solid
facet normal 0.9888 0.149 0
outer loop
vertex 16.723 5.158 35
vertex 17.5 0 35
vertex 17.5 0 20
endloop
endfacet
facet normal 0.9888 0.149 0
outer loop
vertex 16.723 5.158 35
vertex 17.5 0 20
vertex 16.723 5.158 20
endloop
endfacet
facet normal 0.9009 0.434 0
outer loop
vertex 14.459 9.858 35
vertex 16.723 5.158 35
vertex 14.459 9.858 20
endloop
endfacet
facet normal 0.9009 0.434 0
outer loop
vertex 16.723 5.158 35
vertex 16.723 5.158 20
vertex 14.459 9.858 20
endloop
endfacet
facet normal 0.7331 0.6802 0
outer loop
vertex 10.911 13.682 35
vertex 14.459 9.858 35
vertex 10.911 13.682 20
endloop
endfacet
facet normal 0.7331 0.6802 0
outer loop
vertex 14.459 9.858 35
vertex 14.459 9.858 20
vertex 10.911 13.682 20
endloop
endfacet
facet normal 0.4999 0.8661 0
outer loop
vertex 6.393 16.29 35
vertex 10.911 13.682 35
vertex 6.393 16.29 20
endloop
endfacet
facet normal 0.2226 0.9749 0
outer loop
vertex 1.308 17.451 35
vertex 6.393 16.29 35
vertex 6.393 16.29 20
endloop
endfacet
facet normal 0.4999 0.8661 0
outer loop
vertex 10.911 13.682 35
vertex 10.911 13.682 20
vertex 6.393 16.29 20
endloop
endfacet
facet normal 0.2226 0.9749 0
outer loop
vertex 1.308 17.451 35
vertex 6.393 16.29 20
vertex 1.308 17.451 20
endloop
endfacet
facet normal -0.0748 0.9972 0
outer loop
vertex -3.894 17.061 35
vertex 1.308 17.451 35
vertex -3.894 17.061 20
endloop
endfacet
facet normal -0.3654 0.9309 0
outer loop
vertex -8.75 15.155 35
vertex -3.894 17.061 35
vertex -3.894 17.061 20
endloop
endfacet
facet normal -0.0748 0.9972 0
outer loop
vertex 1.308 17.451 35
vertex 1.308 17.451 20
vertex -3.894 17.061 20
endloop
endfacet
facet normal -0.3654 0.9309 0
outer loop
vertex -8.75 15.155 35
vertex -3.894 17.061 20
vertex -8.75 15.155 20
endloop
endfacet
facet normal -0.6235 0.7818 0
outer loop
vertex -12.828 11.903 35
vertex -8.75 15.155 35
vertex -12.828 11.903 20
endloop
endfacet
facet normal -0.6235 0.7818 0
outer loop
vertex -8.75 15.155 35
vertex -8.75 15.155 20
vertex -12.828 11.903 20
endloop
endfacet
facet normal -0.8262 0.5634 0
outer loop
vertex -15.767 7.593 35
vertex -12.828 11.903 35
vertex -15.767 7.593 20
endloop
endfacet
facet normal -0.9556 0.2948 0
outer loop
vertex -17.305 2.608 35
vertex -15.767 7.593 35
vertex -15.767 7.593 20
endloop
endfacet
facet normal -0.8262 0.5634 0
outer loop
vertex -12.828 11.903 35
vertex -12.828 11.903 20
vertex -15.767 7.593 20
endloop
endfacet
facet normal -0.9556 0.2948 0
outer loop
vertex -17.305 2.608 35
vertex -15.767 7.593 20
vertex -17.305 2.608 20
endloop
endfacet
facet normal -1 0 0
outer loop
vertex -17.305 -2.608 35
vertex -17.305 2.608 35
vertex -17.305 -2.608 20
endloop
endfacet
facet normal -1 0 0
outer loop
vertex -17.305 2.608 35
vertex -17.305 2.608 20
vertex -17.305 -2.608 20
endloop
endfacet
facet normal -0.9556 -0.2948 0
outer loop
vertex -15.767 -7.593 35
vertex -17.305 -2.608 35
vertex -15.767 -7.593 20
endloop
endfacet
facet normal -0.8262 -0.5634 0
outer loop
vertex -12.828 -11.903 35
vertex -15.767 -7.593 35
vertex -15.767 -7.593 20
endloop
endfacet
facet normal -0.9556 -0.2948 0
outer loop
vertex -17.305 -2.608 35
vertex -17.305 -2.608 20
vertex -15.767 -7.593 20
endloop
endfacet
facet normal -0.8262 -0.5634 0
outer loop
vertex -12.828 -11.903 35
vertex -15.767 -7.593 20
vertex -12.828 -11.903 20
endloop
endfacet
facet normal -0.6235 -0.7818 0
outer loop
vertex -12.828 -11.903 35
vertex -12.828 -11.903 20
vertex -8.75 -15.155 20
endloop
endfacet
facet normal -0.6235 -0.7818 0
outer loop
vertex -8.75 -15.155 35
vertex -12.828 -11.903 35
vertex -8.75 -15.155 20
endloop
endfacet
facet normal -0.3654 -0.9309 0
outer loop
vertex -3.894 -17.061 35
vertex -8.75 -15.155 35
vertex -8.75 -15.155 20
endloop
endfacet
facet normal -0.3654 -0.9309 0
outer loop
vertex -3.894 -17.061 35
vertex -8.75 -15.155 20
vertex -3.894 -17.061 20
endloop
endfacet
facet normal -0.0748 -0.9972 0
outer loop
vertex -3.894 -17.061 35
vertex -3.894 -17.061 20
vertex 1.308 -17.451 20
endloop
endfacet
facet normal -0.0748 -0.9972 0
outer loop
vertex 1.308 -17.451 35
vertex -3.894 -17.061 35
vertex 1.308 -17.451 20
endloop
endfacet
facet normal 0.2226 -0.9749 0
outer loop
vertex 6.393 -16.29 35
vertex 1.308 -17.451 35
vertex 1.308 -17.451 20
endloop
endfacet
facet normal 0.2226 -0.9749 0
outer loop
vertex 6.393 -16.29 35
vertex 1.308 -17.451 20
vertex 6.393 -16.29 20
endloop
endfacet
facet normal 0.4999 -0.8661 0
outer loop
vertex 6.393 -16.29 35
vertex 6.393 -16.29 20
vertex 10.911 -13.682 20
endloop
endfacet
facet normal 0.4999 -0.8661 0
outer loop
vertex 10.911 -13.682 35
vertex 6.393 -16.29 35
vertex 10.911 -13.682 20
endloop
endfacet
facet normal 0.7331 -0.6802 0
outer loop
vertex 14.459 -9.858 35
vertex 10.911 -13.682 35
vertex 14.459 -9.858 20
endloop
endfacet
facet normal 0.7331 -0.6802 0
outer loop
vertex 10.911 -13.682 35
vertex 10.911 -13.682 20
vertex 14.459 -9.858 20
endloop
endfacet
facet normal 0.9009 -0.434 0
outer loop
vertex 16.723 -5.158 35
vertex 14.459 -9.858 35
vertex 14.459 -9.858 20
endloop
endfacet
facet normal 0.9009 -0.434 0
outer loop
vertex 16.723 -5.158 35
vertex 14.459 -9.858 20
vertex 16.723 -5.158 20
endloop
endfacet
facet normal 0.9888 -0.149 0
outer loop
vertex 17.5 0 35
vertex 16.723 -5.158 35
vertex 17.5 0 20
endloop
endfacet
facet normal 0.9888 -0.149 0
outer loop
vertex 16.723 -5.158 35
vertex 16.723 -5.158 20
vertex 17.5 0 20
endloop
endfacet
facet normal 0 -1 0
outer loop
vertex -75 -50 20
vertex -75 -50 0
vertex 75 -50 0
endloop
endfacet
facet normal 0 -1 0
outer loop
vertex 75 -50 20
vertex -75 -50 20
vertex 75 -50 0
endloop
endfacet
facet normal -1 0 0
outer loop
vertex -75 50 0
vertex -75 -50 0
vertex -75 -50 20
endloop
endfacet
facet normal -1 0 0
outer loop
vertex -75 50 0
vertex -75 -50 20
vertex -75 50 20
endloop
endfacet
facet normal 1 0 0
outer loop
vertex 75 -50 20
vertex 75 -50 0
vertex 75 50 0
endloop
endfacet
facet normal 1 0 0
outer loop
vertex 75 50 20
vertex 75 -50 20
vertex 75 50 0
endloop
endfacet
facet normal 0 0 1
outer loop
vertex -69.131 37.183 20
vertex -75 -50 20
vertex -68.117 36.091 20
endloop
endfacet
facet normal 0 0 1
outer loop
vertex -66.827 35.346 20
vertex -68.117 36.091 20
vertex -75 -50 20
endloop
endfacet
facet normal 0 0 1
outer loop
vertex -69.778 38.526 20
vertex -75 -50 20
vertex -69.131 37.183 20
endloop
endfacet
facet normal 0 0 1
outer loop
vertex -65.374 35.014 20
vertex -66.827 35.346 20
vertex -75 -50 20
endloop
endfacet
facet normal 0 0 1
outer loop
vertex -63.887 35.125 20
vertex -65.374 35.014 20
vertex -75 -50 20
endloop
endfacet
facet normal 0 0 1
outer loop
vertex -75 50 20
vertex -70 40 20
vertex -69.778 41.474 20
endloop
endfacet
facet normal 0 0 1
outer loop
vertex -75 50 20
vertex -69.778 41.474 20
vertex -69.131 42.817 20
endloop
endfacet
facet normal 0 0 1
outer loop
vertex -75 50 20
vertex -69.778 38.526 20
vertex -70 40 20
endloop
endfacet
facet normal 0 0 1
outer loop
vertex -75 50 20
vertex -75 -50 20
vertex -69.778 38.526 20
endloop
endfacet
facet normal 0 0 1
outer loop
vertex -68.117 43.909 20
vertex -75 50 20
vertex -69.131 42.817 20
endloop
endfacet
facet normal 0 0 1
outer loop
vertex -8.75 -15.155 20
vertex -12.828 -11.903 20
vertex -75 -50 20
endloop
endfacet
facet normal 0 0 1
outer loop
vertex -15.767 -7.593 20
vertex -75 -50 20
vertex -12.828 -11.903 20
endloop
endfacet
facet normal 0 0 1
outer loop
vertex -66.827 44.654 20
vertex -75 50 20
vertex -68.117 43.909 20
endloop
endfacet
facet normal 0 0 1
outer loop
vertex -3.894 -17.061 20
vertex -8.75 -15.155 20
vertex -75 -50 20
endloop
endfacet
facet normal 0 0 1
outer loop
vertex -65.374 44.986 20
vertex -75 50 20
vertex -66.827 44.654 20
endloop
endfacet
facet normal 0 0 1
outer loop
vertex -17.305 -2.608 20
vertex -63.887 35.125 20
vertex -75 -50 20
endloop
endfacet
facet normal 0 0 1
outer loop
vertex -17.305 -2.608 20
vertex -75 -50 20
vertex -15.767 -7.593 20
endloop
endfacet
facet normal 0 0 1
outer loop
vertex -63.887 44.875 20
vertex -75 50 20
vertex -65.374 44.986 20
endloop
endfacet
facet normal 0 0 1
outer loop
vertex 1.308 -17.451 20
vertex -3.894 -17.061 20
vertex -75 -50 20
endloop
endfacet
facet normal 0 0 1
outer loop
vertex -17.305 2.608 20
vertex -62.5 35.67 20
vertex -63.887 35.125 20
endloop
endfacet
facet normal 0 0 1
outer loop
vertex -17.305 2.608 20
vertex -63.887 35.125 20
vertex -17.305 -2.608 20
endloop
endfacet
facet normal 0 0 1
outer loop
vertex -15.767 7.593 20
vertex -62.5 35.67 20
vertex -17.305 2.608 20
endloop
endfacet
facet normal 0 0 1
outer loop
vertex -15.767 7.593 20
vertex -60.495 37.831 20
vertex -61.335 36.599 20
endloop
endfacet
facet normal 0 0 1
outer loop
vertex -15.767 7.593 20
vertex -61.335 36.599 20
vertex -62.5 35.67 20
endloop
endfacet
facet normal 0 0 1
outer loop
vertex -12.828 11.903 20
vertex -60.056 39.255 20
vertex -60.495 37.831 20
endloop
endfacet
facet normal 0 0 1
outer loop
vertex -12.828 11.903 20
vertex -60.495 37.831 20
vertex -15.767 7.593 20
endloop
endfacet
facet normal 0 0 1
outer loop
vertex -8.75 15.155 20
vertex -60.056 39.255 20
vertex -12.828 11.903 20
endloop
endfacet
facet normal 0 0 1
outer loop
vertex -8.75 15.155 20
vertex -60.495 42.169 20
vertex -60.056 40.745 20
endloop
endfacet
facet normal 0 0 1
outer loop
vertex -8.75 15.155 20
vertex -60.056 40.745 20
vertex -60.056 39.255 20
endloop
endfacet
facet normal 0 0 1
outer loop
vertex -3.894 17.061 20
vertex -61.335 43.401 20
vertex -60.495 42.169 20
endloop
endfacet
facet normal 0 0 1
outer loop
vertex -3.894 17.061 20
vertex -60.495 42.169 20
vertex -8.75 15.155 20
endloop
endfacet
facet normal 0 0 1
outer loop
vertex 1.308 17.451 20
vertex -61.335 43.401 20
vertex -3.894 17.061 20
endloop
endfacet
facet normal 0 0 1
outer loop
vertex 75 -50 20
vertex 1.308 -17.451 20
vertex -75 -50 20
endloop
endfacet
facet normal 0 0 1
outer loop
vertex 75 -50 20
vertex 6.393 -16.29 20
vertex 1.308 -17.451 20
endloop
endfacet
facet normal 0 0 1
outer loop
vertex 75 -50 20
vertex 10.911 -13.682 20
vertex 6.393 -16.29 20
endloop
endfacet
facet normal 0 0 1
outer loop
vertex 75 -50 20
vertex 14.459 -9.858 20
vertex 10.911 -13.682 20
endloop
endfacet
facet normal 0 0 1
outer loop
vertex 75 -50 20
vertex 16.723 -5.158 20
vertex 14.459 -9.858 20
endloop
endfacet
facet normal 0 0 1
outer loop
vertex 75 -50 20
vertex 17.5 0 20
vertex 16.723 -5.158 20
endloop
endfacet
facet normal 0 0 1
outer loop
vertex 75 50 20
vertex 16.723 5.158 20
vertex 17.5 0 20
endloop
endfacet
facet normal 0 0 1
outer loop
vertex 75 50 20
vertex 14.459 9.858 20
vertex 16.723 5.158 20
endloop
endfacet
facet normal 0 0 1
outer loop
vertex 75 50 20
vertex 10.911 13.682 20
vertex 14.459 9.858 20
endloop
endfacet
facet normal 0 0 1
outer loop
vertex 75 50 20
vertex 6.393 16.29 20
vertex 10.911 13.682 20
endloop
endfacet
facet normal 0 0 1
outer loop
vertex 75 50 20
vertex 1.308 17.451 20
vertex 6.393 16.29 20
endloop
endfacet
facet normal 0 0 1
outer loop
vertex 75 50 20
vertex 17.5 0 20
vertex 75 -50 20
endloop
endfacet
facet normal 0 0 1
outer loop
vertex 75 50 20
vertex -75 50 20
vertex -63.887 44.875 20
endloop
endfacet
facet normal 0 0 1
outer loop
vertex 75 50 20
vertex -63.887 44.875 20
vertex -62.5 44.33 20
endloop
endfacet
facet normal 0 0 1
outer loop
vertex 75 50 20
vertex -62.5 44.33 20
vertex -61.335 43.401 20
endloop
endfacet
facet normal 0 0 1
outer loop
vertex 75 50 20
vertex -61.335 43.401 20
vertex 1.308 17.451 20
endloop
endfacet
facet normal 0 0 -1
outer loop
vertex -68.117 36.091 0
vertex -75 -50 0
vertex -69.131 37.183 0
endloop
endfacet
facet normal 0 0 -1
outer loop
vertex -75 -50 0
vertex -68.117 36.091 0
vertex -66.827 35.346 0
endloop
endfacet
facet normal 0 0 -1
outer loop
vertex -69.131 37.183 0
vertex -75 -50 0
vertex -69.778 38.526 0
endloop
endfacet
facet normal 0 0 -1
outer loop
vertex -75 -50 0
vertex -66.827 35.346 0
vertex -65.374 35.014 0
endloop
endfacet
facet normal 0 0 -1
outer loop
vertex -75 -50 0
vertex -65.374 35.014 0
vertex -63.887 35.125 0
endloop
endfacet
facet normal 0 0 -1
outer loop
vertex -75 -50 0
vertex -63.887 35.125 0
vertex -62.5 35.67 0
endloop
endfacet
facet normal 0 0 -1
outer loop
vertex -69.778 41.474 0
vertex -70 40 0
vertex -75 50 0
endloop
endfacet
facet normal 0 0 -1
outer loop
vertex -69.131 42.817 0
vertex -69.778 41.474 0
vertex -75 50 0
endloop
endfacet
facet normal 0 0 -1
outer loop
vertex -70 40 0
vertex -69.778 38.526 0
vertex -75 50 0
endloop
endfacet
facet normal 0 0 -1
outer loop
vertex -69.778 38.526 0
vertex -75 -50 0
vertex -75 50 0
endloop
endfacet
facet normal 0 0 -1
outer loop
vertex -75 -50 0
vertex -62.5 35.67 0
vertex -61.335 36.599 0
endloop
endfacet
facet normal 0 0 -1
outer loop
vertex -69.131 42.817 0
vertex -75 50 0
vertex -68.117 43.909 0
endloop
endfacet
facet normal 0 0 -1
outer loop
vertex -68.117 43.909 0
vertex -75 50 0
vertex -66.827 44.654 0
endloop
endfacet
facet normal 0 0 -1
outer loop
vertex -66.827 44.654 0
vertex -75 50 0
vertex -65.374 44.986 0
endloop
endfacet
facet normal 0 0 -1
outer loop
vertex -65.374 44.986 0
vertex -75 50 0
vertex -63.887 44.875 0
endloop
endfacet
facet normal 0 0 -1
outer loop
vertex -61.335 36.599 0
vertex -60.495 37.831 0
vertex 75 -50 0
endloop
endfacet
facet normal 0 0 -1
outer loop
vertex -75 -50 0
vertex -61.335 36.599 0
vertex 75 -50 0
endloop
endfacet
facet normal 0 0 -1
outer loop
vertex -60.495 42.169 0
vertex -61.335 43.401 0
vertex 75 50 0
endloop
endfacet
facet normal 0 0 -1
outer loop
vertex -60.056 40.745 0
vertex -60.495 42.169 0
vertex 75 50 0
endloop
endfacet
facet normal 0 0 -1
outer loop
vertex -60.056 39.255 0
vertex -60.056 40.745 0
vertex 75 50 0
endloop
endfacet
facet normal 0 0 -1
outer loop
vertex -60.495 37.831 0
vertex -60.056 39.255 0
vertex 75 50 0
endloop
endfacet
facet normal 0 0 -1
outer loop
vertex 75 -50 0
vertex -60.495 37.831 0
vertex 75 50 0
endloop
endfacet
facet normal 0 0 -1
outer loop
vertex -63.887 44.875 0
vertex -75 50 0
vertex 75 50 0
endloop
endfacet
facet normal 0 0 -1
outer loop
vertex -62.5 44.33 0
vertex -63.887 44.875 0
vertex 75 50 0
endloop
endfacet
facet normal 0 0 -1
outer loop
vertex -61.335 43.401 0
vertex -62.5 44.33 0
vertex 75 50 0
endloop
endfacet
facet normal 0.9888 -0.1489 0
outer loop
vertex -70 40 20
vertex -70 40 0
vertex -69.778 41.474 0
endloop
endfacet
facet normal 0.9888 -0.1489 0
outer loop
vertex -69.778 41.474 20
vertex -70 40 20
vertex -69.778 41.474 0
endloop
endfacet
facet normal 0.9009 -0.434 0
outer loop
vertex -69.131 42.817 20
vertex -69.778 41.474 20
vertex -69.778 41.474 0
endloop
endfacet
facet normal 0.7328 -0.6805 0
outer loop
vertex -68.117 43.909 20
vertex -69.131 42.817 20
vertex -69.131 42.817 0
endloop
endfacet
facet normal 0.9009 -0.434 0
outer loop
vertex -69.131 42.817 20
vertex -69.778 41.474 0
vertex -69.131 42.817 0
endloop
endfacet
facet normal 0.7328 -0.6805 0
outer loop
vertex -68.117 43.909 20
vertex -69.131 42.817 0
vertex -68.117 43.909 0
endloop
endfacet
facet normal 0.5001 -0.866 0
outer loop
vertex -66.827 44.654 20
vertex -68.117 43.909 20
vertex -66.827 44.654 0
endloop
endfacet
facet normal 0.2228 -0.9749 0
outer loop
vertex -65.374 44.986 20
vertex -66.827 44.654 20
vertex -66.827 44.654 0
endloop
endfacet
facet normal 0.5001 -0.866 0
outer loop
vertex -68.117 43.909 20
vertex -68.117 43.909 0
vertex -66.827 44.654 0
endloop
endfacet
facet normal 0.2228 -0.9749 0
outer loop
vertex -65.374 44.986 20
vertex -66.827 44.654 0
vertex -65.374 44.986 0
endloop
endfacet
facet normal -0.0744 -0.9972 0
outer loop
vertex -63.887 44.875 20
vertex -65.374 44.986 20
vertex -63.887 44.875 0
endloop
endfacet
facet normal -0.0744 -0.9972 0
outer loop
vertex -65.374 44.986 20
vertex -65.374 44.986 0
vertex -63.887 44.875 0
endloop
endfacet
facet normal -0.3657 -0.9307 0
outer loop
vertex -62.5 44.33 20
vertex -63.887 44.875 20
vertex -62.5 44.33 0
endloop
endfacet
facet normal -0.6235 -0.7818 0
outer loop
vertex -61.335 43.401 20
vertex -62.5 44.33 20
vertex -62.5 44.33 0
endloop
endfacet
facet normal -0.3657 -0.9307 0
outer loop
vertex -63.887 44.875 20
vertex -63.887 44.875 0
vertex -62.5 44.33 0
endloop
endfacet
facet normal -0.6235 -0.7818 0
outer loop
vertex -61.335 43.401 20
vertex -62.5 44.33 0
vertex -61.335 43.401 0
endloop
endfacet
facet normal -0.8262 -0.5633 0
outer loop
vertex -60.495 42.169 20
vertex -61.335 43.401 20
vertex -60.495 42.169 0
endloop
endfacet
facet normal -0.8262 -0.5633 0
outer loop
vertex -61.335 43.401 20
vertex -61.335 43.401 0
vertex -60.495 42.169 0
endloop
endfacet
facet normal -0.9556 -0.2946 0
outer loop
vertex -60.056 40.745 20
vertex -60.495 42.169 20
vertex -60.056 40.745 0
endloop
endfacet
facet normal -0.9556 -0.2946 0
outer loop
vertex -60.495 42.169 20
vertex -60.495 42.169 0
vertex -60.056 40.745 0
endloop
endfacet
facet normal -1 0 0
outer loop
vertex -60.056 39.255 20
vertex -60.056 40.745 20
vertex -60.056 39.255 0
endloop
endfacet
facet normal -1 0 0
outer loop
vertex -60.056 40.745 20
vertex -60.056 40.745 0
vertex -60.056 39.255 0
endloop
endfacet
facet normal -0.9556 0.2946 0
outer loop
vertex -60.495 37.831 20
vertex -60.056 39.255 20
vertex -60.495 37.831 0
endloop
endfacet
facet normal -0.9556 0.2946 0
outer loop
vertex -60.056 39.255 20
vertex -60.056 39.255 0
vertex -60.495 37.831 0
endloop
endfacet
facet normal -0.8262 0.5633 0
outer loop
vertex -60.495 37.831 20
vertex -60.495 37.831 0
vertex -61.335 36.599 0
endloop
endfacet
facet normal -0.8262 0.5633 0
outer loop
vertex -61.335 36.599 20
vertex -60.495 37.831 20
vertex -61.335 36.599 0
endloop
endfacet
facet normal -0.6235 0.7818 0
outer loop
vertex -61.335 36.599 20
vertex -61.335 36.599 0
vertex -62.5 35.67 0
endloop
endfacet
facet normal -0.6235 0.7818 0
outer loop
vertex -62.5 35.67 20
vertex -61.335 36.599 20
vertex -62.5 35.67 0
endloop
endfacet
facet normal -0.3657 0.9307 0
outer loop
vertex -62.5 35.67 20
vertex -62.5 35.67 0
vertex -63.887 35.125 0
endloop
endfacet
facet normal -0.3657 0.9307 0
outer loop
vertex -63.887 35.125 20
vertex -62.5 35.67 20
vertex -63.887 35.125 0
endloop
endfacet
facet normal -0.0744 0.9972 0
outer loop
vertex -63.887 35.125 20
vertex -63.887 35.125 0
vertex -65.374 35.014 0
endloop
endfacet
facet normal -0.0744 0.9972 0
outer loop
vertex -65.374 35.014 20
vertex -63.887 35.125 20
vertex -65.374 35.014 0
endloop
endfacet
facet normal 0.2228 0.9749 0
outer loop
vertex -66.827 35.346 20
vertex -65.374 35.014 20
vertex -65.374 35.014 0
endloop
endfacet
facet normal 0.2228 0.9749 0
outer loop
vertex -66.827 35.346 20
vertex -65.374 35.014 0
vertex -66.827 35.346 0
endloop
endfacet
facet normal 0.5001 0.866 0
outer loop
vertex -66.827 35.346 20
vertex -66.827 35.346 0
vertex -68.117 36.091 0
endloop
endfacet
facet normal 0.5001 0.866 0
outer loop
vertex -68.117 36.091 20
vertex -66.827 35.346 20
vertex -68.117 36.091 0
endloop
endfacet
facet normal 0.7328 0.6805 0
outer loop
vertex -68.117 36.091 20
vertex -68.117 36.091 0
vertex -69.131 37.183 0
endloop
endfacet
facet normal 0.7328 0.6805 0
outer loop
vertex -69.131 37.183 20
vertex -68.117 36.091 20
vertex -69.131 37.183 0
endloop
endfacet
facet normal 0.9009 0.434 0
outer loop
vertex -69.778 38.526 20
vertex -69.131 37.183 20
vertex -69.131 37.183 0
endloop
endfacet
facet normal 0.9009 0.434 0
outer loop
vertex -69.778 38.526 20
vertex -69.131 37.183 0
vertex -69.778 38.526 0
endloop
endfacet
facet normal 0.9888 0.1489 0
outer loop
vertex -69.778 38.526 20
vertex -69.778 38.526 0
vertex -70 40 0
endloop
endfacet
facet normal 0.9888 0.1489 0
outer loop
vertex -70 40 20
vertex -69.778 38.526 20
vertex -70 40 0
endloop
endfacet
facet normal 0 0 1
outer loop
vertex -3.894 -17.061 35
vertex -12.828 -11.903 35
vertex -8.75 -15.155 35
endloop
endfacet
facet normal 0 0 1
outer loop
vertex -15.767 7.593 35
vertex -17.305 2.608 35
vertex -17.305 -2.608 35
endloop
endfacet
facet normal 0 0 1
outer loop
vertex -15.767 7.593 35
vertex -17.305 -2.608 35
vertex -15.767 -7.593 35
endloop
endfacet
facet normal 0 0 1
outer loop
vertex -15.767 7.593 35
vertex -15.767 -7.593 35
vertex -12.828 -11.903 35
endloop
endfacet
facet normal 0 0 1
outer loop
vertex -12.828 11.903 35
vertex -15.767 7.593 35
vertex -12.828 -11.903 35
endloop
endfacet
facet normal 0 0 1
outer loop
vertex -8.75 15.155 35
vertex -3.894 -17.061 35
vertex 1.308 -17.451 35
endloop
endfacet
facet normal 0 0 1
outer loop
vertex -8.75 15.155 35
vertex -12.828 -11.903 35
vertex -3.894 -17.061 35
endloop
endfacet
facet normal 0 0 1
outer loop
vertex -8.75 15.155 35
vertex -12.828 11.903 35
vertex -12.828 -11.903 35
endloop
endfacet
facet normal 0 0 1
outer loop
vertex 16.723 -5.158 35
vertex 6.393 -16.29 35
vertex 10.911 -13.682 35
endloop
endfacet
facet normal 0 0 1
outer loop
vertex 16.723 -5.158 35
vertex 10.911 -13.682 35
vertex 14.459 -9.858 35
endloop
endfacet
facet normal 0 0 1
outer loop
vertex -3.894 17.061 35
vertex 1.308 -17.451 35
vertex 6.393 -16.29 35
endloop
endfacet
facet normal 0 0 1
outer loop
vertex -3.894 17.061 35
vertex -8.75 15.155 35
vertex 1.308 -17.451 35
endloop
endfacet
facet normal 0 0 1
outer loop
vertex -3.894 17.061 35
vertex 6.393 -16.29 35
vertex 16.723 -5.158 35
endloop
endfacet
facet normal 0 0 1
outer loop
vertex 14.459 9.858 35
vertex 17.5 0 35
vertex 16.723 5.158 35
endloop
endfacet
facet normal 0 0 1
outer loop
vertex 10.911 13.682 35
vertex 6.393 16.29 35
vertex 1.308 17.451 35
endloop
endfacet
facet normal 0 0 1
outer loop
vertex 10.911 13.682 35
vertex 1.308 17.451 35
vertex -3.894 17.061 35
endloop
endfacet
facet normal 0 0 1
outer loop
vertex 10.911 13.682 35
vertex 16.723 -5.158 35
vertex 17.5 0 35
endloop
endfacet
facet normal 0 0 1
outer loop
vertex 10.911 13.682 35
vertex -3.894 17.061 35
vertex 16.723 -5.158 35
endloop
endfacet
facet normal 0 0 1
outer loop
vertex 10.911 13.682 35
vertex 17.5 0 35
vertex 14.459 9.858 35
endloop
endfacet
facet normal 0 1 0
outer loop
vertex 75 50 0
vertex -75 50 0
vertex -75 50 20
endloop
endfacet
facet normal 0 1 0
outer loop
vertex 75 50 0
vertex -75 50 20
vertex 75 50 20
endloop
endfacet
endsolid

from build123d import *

# Parameters (mm, degrees)
F0_W     = 150
F0_H     = 100
F1_DEPTH = 20
F2_R     = 17.5
F3_DEPTH = 15
F5_D     = 10


with BuildPart() as f1:
    # F0 (on Top) → F1 (new body)
    with BuildSketch(Plane.XY):
        Rectangle(F0_W, F0_H)
    extrude(amount=F1_DEPTH)

    # F2 (on face) → F3 (join)
    with BuildSketch(Plane.XY.offset(20)):
        Circle(F2_R)
    extrude(amount=F3_DEPTH)

    # F5 (through all)
    with Locations(Plane.XY.offset(20)):
        with Locations((-65, 40)):
            Hole(F5_D / 2)


solid = f1.part
